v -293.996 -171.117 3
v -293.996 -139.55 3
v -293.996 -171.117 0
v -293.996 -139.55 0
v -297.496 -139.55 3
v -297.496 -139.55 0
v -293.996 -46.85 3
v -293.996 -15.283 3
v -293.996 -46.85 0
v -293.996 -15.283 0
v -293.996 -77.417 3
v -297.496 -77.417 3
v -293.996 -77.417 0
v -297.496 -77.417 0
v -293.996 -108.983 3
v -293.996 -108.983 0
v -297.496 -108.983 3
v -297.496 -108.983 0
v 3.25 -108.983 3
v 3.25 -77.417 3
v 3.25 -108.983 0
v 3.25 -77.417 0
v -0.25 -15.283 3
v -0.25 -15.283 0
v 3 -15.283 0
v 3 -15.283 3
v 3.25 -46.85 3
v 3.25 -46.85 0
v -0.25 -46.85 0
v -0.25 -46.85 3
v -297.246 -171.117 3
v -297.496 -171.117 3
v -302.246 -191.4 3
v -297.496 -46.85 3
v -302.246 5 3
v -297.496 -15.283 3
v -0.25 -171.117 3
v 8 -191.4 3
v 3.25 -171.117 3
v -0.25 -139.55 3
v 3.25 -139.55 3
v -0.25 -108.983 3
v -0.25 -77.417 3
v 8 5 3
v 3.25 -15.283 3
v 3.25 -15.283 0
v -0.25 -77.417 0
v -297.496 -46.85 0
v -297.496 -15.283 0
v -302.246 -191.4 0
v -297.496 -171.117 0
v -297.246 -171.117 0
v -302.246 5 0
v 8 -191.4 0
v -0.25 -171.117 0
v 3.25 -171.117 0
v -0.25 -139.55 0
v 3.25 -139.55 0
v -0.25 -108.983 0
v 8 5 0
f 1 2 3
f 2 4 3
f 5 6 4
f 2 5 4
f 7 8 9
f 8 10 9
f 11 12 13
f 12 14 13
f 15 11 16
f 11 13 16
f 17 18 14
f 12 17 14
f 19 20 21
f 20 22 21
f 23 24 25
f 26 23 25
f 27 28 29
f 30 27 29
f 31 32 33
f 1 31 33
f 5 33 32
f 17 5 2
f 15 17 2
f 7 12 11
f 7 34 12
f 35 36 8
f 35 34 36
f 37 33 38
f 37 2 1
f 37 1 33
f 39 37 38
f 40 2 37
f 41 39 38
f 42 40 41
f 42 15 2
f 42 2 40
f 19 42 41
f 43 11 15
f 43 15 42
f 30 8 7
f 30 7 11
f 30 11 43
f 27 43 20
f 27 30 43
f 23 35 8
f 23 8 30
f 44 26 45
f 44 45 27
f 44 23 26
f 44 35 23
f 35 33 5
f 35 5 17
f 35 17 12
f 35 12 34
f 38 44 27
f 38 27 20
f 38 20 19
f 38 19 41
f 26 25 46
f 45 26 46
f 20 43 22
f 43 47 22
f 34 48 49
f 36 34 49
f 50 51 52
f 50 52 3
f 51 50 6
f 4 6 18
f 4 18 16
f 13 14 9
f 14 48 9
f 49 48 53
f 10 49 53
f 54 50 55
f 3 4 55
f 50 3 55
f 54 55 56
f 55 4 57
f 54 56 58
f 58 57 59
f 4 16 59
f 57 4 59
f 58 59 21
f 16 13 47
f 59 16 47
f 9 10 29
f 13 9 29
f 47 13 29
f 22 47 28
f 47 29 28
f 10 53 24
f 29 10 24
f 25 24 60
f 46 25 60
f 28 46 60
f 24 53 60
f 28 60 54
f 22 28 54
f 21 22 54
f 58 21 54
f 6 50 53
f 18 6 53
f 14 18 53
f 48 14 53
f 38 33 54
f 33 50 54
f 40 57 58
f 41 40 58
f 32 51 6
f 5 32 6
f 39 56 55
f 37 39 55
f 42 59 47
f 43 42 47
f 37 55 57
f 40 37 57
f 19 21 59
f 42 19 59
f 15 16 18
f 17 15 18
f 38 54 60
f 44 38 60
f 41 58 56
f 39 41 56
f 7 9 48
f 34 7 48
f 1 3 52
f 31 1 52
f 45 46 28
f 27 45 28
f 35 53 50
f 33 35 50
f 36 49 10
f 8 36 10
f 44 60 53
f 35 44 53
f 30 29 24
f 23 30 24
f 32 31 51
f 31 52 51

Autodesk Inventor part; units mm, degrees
ref_plane "YZ Plane" through (0, 0, 0) normal (1, 0, 0) x (0, 1, 0)
ref_plane "XZ Plane" through (0, 0, 0) normal (0, 1, 0) x (-1, 0, 0)
ref_plane "XY Plane" through (0, 0, 0) normal (0, 0, 1) x (1, 0, 0)
ref_plane "Work Plane1" through (0, -46.6, 0) normal (0, 0, 1) x (1, 0, 0)
sketch "Sketch1" plane through (0, -46.6, 0) normal (0, 0, 1) x (1, 0, 0)
  line L0 (0, 31.0667) -> (0, 0) projected
  line L1 (0, 0) -> (3, 0) projected
  line L2 (3, 31.0667) -> (3, 0) projected
  line L3 (0, 31.0667) -> (3, 31.0667) projected
  line L4 (0, -31.0667) -> (0, -62.1333) projected
  line L5 (0, -62.1333) -> (3, -62.1333) projected
  line L6 (3, -31.0667) -> (3, -62.1333) projected
  line L7 (0, -31.0667) -> (3, -31.0667) projected
  line L8 (0, -93.2) -> (0, -124.2667) projected
  line L9 (0, -124.2667) -> (3, -124.2667) projected
  line L10 (3, -93.2) -> (3, -124.2667) projected
  line L11 (0, -93.2) -> (3, -93.2) projected
  line L12 (-297.2462, 31.0667) -> (-297.2462, 0) projected
  line L13 (-297.2462, 0) -> (-294.2462, 0) projected
  line L14 (-294.2462, 31.0667) -> (-294.2462, 0) projected
  line L15 (-297.2462, 31.0667) -> (-294.2462, 31.0667) projected
  line L16 (-297.2462, -31.0667) -> (-297.2462, -62.1333) projected
  line L17 (-297.2462, -62.1333) -> (-294.2462, -62.1333) projected
  line L18 (-294.2462, -31.0667) -> (-294.2462, -62.1333) projected
  line L19 (-297.2462, -31.0667) -> (-294.2462, -31.0667) projected
  line L20 (-297.2462, -93.2) -> (-297.2462, -124.2667) projected
  line L21 (-297.2462, -124.2667) -> (-294.2462, -124.2667) projected
  line L22 (-294.2462, -93.2) -> (-294.2462, -124.2667) projected
  line L23 (-297.2462, -93.2) -> (-294.2462, -93.2) projected
  line L24 (3, 46.6) -> (3, 31.0667) projected
  line L25 (-297.2462, -124.2667) -> (-297.2462, -139.8) projected
  line L26 (8, 51.6) -> (-302.2462, 51.6)
  line L27 (-302.2462, 51.6) -> (-302.2462, -144.8)
  line L28 (-302.2462, -144.8) -> (8, -144.8)
  line L29 (8, -144.8) -> (8, 51.6)
  line L30 (-293.9962, 31.3167) -> (-293.9962, -0.25)
  line L31 (-293.9962, -0.25) -> (-297.4962, -0.25)
  line L32 (-297.4962, -0.25) -> (-297.4962, 31.3167)
  line L33 (-297.4962, 31.3167) -> (-293.9962, 31.3167)
  line L34 (-293.9962, -30.8167) -> (-293.9962, -62.3833)
  line L35 (-293.9962, -62.3833) -> (-297.4962, -62.3833)
  line L36 (-297.4962, -62.3833) -> (-297.4962, -30.8167)
  line L37 (-297.4962, -30.8167) -> (-293.9962, -30.8167)
  line L38 (-293.9962, -124.5167) -> (-297.4962, -124.5167)
  line L39 (-297.4962, -124.5167) -> (-297.4962, -92.95)
  line L40 (-297.4962, -92.95) -> (-293.9962, -92.95)
  line L41 (-293.9962, -92.95) -> (-293.9962, -124.5167)
  line L42 (3.25, 31.3167) -> (3.25, -0.25)
  line L43 (3.25, -0.25) -> (-0.25, -0.25)
  line L44 (-0.25, -0.25) -> (-0.25, 31.3167)
  line L45 (-0.25, 31.3167) -> (3.25, 31.3167)
  line L46 (3.25, -30.8167) -> (3.25, -62.3833)
  line L47 (3.25, -62.3833) -> (-0.25, -62.3833)
  line L48 (-0.25, -62.3833) -> (-0.25, -30.8167)
  line L49 (-0.25, -30.8167) -> (3.25, -30.8167)
  line L50 (3.25, -92.95) -> (3.25, -124.5167)
  line L51 (3.25, -124.5167) -> (-0.25, -124.5167)
  line L52 (-0.25, -124.5167) -> (-0.25, -92.95)
  line L53 (-0.25, -92.95) -> (3.25, -92.95)
  point P0 (0, 46.6)
  dimension "d0" = 5
  dimension "d1" = 5
  dimension "d2" = 5
  dimension "d3" = 5
  dimension "d6" = 0.25
  dimension "d7" = 0.25
  dimension "d8" = 0.25
  dimension "d9" = 0.25
  dimension "d10" = 0.25
  dimension "d11" = 0.25
extrude "Extrusion1" add sketch "Sketch1" along normal blind 3 contours L29 L28 L27 L26
sketch "Sketch2" plane through (0, -46.6, 3) normal (0, 0, 1) x (1, 0, 0)
  line L0 (-302.2462, 51.6) -> (-302.2462, -144.8) projected
  line L1 (-302.2462, -144.8) -> (8, -144.8) projected
  line L2 (8, -144.8) -> (8, 51.6) projected
  line L3 (8, 51.6) -> (-302.2462, 51.6) projected
  line L4 (3.25, -92.95) -> (3.25, -124.5167) projected
  line L5 (3.25, -124.5167) -> (-0.25, -124.5167) projected
  line L6 (-0.25, -124.5167) -> (-0.25, -92.95) projected
  line L7 (-0.25, -92.95) -> (3.25, -92.95) projected
  line L8 (3.25, -30.8167) -> (3.25, -62.3833) projected
  line L9 (3.25, -62.3833) -> (-0.25, -62.3833) projected
  line L10 (-0.25, -62.3833) -> (-0.25, -30.8167) projected
  line L11 (-0.25, -30.8167) -> (3.25, -30.8167) projected
  line L12 (-293.9962, -30.8167) -> (-293.9962, -62.3833) projected
  line L13 (-293.9962, -62.3833) -> (-297.4962, -62.3833) projected
  line L14 (-297.4962, -62.3833) -> (-297.4962, -30.8167) projected
  line L15 (-297.4962, -30.8167) -> (-293.9962, -30.8167) projected
  line L16 (-293.9962, 31.3167) -> (-293.9962, -0.25) projected
  line L17 (-293.9962, -0.25) -> (-297.4962, -0.25) projected
  line L18 (-297.4962, -0.25) -> (-297.4962, 31.3167) projected
  line L19 (-297.4962, 31.3167) -> (-293.9962, 31.3167) projected
  line L20 (-0.25, -0.25) -> (-0.25, 31.3167) projected
  line L21 (-0.25, 31.3167) -> (3.25, 31.3167) projected
  line L22 (3.25, 31.3167) -> (3.25, -0.25) projected
  line L23 (3.25, -0.25) -> (-0.25, -0.25) projected
  line L24 (-293.9962, -92.95) -> (-293.9962, -124.5167) projected
  line L25 (-293.9962, -124.5167) -> (-297.4962, -124.5167) projected
  line L26 (-297.4962, -124.5167) -> (-297.4962, -92.95) projected
  line L27 (-297.4962, -92.95) -> (-293.9962, -92.95) projected
  point P0 (0, 46.6)
equation "\"d7\" = d6"
equation "\"d8\" = d6"
equation "\"d9\" = d6"
equation "\"d10\" = d6"
equation "\"d11\" = d6"
properties part number "Stand Base" material "Wood (Oak)"
